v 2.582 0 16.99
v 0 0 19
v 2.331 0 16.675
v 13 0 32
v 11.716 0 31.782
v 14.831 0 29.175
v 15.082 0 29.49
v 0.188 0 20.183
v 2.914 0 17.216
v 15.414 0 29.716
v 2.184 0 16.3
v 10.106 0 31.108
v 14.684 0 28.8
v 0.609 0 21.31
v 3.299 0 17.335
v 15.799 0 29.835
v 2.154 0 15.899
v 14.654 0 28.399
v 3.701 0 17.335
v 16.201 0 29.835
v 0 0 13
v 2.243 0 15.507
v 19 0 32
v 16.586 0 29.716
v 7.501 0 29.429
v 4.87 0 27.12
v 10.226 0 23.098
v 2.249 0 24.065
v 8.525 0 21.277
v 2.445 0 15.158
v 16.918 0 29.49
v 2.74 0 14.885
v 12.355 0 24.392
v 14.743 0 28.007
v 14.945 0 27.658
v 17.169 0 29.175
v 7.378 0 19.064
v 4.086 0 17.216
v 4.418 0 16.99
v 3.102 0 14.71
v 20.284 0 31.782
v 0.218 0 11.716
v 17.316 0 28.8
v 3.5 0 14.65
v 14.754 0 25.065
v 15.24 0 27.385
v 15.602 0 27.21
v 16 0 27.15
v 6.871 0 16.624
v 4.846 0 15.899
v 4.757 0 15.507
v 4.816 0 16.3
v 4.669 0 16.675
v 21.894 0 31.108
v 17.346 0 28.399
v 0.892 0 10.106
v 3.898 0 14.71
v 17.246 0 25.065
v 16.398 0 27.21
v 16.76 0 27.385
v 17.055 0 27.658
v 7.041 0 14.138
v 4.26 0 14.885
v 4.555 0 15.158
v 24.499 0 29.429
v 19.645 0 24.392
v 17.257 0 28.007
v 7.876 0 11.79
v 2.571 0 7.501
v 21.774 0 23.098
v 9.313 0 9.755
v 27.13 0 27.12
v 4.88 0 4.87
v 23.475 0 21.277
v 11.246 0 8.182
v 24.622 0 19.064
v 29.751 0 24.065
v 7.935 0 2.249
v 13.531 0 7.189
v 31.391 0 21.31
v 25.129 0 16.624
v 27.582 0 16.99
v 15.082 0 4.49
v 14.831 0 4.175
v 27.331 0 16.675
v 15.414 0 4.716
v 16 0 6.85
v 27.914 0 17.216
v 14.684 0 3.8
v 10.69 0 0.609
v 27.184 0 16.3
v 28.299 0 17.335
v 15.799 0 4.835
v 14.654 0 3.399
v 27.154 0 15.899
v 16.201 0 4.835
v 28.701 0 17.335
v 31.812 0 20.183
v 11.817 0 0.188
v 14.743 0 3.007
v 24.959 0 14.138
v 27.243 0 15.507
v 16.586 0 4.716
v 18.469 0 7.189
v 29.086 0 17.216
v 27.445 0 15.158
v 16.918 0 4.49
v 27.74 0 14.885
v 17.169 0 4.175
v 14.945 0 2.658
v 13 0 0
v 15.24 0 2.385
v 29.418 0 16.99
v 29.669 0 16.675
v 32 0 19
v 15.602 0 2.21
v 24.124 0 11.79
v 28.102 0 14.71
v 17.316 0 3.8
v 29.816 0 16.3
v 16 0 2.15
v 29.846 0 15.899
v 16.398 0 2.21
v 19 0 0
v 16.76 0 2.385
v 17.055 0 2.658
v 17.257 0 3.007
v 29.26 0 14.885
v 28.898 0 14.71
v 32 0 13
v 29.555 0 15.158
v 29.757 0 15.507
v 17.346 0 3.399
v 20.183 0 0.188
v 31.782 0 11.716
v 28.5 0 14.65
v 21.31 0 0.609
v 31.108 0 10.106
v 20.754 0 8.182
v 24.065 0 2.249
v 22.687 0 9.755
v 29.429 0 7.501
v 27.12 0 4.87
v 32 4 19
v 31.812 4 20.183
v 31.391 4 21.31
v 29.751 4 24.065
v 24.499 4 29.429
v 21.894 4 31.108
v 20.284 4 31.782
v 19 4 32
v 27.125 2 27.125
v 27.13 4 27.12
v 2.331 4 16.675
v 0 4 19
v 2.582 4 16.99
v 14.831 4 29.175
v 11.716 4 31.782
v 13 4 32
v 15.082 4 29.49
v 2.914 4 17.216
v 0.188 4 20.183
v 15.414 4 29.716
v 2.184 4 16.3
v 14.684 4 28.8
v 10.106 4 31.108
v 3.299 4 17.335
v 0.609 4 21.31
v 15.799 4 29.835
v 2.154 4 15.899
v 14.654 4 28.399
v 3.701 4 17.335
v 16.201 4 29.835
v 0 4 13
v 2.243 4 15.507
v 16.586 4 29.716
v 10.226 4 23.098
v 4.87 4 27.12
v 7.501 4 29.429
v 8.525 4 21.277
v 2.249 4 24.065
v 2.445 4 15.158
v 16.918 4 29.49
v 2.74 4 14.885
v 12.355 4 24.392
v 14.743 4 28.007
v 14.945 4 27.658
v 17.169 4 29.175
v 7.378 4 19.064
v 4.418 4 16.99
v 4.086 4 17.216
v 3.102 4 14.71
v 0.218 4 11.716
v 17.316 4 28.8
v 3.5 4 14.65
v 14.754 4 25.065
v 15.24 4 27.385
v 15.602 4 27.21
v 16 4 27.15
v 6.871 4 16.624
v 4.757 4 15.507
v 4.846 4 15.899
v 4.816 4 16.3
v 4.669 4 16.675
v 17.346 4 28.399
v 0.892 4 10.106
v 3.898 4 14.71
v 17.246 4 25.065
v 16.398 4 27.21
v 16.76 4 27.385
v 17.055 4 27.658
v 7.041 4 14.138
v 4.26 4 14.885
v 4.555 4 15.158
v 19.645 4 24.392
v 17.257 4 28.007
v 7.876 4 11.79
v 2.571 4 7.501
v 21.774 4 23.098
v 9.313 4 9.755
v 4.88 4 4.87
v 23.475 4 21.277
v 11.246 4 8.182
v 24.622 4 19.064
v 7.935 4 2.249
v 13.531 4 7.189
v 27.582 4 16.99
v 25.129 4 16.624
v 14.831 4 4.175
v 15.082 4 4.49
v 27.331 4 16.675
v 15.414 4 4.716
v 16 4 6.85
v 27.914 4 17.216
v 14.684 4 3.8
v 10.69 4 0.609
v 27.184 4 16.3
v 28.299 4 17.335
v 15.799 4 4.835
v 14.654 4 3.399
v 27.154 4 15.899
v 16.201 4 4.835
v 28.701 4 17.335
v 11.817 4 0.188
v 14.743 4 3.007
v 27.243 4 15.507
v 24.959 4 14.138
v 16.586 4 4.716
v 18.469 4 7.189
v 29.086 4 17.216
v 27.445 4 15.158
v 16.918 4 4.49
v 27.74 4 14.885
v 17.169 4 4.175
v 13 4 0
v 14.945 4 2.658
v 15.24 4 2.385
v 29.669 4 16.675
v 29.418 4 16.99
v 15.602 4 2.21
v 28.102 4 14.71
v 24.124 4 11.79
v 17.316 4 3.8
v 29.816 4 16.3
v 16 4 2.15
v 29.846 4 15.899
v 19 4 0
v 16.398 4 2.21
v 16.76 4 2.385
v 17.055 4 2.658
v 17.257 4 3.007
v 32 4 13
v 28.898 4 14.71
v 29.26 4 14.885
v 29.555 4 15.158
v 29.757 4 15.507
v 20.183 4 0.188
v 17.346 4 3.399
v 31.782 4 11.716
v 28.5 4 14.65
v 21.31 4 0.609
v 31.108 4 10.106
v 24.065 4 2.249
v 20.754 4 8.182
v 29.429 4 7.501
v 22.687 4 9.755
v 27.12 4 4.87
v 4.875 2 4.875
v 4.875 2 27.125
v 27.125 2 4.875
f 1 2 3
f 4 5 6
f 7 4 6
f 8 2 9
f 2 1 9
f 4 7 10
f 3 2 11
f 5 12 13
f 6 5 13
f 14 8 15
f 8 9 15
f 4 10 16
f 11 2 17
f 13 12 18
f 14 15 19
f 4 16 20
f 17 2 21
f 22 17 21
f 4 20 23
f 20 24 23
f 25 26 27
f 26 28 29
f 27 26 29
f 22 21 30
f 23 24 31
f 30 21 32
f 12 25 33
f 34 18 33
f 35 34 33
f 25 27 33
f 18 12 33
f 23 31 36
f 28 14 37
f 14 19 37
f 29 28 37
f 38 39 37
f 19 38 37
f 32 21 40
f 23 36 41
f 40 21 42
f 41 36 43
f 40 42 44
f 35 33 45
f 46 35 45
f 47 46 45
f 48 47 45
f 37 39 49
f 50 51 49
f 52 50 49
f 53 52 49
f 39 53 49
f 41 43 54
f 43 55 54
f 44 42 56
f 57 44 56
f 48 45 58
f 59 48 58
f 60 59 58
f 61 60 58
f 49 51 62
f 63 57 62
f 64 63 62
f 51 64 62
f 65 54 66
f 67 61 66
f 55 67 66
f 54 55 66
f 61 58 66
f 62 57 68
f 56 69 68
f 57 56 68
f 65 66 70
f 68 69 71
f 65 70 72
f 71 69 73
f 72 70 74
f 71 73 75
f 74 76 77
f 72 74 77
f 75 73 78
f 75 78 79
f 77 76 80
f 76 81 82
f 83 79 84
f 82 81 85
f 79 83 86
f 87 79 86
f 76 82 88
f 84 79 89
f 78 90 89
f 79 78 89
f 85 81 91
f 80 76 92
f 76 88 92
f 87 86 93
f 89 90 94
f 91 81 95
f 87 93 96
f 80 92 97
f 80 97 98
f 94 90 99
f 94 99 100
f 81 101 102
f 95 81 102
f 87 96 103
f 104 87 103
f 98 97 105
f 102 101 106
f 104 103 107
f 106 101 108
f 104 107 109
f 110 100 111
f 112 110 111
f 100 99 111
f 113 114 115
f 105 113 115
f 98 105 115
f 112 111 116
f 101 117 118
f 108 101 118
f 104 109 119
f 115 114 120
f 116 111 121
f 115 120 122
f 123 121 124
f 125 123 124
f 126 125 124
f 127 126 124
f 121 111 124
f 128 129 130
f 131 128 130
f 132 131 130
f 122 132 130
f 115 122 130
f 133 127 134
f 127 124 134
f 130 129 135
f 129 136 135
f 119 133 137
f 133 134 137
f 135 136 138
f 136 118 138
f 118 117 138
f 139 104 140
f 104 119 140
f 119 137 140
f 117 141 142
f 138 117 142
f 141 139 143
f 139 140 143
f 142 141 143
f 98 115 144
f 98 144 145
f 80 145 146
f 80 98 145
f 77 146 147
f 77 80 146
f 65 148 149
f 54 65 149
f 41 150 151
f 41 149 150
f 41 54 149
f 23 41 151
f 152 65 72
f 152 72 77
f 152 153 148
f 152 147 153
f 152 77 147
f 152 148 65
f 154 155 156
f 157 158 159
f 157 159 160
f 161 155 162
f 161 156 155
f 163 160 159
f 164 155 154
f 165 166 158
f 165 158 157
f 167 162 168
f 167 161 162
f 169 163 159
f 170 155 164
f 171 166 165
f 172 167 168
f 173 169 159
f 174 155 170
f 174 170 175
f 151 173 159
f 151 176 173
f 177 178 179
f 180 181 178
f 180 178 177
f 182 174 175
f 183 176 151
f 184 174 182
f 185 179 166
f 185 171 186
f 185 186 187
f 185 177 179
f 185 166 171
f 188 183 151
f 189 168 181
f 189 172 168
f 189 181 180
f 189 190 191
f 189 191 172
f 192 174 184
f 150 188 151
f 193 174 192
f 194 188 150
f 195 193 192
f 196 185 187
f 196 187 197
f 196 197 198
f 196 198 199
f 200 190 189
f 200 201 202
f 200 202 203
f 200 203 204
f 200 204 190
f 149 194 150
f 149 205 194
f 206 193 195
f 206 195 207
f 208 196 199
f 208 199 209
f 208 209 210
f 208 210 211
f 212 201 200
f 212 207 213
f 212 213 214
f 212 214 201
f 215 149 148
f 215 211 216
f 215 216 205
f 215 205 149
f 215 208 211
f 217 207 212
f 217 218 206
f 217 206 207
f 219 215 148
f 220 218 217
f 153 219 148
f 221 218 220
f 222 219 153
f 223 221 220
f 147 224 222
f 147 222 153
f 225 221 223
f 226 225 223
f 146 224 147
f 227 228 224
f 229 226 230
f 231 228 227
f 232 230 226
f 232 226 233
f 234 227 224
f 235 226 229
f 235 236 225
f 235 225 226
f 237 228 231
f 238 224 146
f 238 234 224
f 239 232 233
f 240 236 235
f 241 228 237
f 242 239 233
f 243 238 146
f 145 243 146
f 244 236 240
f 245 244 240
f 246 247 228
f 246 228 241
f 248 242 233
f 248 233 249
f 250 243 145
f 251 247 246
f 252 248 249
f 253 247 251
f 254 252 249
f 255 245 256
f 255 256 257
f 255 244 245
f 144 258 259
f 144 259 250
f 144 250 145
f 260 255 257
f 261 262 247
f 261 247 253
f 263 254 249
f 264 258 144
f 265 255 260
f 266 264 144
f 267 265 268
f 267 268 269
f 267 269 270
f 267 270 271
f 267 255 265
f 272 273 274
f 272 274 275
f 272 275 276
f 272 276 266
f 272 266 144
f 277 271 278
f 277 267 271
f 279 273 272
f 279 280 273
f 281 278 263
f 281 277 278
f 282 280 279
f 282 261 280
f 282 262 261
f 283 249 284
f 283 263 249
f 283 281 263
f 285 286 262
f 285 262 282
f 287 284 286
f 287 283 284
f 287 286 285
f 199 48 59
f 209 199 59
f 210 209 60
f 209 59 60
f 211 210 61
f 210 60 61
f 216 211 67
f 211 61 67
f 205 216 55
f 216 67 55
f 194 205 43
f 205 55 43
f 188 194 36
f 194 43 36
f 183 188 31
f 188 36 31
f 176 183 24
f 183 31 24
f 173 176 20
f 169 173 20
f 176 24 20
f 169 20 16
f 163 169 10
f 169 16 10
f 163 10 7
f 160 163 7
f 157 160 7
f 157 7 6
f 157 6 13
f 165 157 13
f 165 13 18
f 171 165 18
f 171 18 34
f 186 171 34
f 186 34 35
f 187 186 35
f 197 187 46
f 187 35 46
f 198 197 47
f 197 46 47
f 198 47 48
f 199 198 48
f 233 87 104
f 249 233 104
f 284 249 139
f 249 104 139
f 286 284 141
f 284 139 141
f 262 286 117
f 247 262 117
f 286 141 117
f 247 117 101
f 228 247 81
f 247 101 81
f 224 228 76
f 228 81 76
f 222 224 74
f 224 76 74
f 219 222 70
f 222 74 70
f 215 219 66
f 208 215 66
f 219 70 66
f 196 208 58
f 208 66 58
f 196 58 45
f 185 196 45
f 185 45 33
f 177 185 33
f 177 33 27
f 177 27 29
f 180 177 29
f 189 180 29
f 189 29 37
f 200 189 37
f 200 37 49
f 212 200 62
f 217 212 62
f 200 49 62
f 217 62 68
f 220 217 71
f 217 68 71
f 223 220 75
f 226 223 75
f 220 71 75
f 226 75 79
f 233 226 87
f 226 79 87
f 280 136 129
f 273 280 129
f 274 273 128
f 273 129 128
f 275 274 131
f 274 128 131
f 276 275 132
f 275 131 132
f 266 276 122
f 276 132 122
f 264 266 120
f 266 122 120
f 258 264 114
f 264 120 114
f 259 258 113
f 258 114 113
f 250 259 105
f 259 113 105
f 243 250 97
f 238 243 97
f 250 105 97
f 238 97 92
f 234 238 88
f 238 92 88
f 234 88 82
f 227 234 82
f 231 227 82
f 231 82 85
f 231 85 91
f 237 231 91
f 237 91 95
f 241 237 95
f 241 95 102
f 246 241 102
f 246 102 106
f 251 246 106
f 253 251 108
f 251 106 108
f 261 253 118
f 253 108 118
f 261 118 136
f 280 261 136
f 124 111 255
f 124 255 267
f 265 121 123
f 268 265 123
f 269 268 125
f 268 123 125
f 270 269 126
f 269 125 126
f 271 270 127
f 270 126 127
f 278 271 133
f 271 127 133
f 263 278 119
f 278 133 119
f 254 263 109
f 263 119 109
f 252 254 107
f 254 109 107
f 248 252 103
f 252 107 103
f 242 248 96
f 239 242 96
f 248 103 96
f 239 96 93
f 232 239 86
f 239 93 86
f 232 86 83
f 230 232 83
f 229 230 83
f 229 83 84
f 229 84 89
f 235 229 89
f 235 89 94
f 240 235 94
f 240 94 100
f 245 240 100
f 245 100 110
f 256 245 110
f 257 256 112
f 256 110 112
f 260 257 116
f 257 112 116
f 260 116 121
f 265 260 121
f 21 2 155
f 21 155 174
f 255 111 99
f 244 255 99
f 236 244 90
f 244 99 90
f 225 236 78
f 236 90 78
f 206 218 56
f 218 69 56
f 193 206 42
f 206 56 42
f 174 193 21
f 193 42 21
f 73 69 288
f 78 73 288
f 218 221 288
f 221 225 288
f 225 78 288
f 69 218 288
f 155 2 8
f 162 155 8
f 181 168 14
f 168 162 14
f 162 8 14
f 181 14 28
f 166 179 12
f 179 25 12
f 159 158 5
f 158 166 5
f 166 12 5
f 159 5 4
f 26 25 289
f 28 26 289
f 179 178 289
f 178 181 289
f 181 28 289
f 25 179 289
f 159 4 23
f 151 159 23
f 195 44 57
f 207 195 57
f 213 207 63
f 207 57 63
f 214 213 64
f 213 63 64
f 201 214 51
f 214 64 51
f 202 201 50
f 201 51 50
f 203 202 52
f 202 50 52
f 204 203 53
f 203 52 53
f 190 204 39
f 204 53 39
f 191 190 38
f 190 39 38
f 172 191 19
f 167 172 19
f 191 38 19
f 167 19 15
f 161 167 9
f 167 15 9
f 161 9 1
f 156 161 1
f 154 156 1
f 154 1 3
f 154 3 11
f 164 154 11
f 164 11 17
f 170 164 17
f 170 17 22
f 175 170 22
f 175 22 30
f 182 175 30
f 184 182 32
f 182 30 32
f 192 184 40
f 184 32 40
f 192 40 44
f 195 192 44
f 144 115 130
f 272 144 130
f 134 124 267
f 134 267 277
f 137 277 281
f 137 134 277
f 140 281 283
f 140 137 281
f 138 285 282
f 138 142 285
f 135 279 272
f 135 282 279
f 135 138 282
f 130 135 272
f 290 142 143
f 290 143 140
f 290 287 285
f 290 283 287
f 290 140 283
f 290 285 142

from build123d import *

# Parameters (mm, degrees)
SKETCH1_W           = 32
SKETCH1_H           = 32
BOSS_EXTRUDE1_DEPTH = 4
SKETCH2_R           = 9.15
SKETCH2_R_2         = 1.35
CUT_EXTRUDE1_DEPTH  = 4
FILLET1_SIZE        = 13


with BuildPart() as part:
    # Sketch1 → Boss-Extrude1 (new body)
    with BuildSketch(Plane(origin=(0, 0, 0), x_dir=(1, 0, 0), z_dir=(0, 1, 0))):
        with Locations((16, -16)):
            Rectangle(SKETCH1_W, SKETCH1_H)
    extrude(amount=BOSS_EXTRUDE1_DEPTH)

    # Sketch2 → Cut-Extrude1 (cut)
    with BuildSketch(Plane(origin=(0, 0, 0), x_dir=(-1, 0, 0), z_dir=(0, -1, 0))):
        with Locations(Location((-16, -16, 0), (0, 0, 90))):
            Circle(SKETCH2_R)
        with Locations(Location((-16, -28.5, 0), (0, 0, 90))):
            Circle(SKETCH2_R_2)
        with Locations(Location((-28.5, -16, 0), (0, 0, 90))):
            Circle(SKETCH2_R_2)
        with Locations(Location((-16, -3.5, 0), (0, 0, 90))):
            Circle(SKETCH2_R_2)
        with Locations(Location((-3.5, -16, 0), (0, 0, 90))):
            Circle(SKETCH2_R_2)
    extrude(amount=-CUT_EXTRUDE1_DEPTH, mode=Mode.SUBTRACT)

    # Fillet1
    # a fillet whose section is not a circle: 13 mm, written as the material it takes off along each edge
    with BuildSketch(Plane(origin=(0, -32.5, 0), x_dir=(1, 0, 0), z_dir=(0, 1, 0)), Plane(origin=(0, -32.5, 32), x_dir=(0, 0, -1), z_dir=(0, 1, 0))) as fillet1_piece_1:
        with BuildLine():
            Bezier((FILLET1_SIZE, 0), (0, 0), (0, -FILLET1_SIZE), weights=[1, 0.333333333, 1])
            Line((0, -FILLET1_SIZE), (0, 0))
            Line((0, 0), (FILLET1_SIZE, 0))
        make_face()
    extrude(amount=69, mode=Mode.SUBTRACT)
    with BuildSketch(Plane(origin=(32, -32.5, 0), x_dir=(-1, 0, 0), z_dir=(0, 1, 0)), Plane(origin=(32, -32.5, 32), x_dir=(0, 0, -1), z_dir=(0, 1, 0))) as fillet1_piece_2:
        with BuildLine():
            Bezier((FILLET1_SIZE, 0), (0, 0), (0, FILLET1_SIZE), weights=[1, 0.333333333, 1])
            Line((0, FILLET1_SIZE), (0, 0))
            Line((0, 0), (FILLET1_SIZE, 0))
        make_face()
    extrude(amount=69, mode=Mode.SUBTRACT)


solid = part.part
